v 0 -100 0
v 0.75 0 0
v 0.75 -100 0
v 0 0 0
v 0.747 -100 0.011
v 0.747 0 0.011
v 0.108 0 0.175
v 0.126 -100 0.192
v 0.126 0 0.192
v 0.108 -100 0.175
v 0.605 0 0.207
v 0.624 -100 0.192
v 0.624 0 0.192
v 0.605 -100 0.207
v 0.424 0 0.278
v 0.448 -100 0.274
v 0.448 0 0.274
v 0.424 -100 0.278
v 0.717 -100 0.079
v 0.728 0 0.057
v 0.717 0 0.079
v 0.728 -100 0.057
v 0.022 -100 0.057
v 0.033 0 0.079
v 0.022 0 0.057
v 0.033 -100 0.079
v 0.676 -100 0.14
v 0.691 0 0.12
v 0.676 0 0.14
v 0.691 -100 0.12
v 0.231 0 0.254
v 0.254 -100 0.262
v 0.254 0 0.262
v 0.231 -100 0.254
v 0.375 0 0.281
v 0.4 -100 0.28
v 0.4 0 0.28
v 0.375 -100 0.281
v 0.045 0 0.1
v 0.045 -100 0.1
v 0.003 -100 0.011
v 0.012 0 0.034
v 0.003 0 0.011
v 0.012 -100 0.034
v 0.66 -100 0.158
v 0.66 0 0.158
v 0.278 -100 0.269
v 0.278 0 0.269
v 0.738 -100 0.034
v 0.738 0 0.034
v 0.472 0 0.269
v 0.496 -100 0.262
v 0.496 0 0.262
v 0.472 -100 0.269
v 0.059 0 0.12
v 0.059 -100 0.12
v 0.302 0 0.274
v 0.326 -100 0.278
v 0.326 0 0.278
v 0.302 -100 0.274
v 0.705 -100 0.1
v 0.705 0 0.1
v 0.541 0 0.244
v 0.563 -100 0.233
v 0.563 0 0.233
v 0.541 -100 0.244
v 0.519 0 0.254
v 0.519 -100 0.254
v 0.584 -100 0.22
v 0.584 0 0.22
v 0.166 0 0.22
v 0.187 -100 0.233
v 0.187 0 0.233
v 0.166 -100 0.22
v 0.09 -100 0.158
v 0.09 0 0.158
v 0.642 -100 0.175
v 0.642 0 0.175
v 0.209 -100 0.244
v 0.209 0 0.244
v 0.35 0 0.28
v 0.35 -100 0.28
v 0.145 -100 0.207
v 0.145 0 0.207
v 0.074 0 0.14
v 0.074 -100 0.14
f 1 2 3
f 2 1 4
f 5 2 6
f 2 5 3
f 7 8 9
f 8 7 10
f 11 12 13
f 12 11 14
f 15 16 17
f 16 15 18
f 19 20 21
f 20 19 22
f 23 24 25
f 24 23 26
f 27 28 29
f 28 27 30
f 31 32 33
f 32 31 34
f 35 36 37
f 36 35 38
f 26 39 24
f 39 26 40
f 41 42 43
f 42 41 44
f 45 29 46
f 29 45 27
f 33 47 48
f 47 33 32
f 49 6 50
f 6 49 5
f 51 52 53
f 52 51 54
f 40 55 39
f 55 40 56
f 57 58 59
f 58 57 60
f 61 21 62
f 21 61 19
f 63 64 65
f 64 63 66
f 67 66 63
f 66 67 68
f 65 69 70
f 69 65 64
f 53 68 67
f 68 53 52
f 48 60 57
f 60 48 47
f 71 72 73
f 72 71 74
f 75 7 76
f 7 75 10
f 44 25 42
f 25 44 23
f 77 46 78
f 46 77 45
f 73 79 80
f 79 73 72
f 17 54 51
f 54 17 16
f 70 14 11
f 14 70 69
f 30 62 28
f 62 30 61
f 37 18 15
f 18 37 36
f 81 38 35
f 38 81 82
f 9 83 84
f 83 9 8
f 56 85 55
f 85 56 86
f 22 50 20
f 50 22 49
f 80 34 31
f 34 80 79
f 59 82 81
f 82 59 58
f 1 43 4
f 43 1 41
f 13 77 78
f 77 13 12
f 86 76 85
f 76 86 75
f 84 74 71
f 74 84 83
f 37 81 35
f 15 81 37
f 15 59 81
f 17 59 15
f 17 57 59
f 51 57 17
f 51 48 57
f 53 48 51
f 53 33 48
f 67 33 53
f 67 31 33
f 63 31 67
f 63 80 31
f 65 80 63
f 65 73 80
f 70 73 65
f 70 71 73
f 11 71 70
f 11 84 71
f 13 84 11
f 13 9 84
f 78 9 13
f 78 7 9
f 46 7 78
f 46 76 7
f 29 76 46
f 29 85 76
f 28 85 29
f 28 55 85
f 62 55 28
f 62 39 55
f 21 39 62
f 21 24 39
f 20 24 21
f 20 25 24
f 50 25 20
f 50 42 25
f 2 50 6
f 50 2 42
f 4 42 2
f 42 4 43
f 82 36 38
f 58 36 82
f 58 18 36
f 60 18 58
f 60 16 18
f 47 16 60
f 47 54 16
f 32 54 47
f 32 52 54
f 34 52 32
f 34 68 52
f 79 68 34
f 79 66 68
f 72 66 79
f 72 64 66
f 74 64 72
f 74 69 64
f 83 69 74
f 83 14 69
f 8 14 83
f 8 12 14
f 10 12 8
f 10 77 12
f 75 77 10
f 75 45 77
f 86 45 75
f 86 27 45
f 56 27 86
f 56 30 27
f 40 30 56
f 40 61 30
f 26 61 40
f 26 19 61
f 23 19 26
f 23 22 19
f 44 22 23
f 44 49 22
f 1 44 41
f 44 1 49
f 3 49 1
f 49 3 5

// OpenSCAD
// --------------------------
// Global Parameters
// --------------------------
$fn = 100; // Smoothness for curved surfaces

// Base dimensions
base_length = 0.75;         // X-axis, left-right span
base_width = 0.21875;       // Y-axis, front-back span
base_declared_height = 0.28125; // Nominal max height
base_extrusion_depth = 0.2812;  // Actual extrusion height of base

// Cutout parameters
cut_radius = 0.0312;        // Radius of each circular cut
cut_depth = 0.0625;         // Depth of each cut
cut_z_start = 0.1081;       // Z position of cut bottom (above base datum)

// Cut positions (distance from left edge X=0, front edge Y=0)
cut1_x = 0.0717;
cut1_y = 0.0625;
cut2_x = 0.6692;
cut2_y = 0.0625;

// --------------------------
// Module: Arched Base
// Creates solid base with arched side profile, full footprint coverage
// --------------------------
module arched_base(length, width, height) {
  half_length = length / 2;
  // Calculate circle parameters for curved arch profile
  circle_center_z = (pow(height, 2) - pow(half_length, 2)) / (2 * height);
  arch_radius = height - circle_center_z;

  // Rotate 2D profile to X-Z plane, extrude along full Y width
  rotate([90, 0, 0]) linear_extrude(length = width, center = false) {
    intersection() {
      // Base circle for arch curve
      translate([half_length, circle_center_z]) circle(r = arch_radius);
      // Clip to valid base bounds (full X span, Z >= 0)
      square([length, height], center = false);
    }
  }
}

// --------------------------
// Main Model Assembly
// --------------------------
difference() {
  // Main base solid
  arched_base(base_length, base_width, base_extrusion_depth);

  // First independent circular cut
  translate([cut1_x, cut1_y, cut_z_start])
    cylinder(h = cut_depth, r = cut_radius, center = false);

  // Second independent circular cut
  translate([cut2_x, cut2_y, cut_z_start])
    cylinder(h = cut_depth, r = cut_radius, center = false);
}
